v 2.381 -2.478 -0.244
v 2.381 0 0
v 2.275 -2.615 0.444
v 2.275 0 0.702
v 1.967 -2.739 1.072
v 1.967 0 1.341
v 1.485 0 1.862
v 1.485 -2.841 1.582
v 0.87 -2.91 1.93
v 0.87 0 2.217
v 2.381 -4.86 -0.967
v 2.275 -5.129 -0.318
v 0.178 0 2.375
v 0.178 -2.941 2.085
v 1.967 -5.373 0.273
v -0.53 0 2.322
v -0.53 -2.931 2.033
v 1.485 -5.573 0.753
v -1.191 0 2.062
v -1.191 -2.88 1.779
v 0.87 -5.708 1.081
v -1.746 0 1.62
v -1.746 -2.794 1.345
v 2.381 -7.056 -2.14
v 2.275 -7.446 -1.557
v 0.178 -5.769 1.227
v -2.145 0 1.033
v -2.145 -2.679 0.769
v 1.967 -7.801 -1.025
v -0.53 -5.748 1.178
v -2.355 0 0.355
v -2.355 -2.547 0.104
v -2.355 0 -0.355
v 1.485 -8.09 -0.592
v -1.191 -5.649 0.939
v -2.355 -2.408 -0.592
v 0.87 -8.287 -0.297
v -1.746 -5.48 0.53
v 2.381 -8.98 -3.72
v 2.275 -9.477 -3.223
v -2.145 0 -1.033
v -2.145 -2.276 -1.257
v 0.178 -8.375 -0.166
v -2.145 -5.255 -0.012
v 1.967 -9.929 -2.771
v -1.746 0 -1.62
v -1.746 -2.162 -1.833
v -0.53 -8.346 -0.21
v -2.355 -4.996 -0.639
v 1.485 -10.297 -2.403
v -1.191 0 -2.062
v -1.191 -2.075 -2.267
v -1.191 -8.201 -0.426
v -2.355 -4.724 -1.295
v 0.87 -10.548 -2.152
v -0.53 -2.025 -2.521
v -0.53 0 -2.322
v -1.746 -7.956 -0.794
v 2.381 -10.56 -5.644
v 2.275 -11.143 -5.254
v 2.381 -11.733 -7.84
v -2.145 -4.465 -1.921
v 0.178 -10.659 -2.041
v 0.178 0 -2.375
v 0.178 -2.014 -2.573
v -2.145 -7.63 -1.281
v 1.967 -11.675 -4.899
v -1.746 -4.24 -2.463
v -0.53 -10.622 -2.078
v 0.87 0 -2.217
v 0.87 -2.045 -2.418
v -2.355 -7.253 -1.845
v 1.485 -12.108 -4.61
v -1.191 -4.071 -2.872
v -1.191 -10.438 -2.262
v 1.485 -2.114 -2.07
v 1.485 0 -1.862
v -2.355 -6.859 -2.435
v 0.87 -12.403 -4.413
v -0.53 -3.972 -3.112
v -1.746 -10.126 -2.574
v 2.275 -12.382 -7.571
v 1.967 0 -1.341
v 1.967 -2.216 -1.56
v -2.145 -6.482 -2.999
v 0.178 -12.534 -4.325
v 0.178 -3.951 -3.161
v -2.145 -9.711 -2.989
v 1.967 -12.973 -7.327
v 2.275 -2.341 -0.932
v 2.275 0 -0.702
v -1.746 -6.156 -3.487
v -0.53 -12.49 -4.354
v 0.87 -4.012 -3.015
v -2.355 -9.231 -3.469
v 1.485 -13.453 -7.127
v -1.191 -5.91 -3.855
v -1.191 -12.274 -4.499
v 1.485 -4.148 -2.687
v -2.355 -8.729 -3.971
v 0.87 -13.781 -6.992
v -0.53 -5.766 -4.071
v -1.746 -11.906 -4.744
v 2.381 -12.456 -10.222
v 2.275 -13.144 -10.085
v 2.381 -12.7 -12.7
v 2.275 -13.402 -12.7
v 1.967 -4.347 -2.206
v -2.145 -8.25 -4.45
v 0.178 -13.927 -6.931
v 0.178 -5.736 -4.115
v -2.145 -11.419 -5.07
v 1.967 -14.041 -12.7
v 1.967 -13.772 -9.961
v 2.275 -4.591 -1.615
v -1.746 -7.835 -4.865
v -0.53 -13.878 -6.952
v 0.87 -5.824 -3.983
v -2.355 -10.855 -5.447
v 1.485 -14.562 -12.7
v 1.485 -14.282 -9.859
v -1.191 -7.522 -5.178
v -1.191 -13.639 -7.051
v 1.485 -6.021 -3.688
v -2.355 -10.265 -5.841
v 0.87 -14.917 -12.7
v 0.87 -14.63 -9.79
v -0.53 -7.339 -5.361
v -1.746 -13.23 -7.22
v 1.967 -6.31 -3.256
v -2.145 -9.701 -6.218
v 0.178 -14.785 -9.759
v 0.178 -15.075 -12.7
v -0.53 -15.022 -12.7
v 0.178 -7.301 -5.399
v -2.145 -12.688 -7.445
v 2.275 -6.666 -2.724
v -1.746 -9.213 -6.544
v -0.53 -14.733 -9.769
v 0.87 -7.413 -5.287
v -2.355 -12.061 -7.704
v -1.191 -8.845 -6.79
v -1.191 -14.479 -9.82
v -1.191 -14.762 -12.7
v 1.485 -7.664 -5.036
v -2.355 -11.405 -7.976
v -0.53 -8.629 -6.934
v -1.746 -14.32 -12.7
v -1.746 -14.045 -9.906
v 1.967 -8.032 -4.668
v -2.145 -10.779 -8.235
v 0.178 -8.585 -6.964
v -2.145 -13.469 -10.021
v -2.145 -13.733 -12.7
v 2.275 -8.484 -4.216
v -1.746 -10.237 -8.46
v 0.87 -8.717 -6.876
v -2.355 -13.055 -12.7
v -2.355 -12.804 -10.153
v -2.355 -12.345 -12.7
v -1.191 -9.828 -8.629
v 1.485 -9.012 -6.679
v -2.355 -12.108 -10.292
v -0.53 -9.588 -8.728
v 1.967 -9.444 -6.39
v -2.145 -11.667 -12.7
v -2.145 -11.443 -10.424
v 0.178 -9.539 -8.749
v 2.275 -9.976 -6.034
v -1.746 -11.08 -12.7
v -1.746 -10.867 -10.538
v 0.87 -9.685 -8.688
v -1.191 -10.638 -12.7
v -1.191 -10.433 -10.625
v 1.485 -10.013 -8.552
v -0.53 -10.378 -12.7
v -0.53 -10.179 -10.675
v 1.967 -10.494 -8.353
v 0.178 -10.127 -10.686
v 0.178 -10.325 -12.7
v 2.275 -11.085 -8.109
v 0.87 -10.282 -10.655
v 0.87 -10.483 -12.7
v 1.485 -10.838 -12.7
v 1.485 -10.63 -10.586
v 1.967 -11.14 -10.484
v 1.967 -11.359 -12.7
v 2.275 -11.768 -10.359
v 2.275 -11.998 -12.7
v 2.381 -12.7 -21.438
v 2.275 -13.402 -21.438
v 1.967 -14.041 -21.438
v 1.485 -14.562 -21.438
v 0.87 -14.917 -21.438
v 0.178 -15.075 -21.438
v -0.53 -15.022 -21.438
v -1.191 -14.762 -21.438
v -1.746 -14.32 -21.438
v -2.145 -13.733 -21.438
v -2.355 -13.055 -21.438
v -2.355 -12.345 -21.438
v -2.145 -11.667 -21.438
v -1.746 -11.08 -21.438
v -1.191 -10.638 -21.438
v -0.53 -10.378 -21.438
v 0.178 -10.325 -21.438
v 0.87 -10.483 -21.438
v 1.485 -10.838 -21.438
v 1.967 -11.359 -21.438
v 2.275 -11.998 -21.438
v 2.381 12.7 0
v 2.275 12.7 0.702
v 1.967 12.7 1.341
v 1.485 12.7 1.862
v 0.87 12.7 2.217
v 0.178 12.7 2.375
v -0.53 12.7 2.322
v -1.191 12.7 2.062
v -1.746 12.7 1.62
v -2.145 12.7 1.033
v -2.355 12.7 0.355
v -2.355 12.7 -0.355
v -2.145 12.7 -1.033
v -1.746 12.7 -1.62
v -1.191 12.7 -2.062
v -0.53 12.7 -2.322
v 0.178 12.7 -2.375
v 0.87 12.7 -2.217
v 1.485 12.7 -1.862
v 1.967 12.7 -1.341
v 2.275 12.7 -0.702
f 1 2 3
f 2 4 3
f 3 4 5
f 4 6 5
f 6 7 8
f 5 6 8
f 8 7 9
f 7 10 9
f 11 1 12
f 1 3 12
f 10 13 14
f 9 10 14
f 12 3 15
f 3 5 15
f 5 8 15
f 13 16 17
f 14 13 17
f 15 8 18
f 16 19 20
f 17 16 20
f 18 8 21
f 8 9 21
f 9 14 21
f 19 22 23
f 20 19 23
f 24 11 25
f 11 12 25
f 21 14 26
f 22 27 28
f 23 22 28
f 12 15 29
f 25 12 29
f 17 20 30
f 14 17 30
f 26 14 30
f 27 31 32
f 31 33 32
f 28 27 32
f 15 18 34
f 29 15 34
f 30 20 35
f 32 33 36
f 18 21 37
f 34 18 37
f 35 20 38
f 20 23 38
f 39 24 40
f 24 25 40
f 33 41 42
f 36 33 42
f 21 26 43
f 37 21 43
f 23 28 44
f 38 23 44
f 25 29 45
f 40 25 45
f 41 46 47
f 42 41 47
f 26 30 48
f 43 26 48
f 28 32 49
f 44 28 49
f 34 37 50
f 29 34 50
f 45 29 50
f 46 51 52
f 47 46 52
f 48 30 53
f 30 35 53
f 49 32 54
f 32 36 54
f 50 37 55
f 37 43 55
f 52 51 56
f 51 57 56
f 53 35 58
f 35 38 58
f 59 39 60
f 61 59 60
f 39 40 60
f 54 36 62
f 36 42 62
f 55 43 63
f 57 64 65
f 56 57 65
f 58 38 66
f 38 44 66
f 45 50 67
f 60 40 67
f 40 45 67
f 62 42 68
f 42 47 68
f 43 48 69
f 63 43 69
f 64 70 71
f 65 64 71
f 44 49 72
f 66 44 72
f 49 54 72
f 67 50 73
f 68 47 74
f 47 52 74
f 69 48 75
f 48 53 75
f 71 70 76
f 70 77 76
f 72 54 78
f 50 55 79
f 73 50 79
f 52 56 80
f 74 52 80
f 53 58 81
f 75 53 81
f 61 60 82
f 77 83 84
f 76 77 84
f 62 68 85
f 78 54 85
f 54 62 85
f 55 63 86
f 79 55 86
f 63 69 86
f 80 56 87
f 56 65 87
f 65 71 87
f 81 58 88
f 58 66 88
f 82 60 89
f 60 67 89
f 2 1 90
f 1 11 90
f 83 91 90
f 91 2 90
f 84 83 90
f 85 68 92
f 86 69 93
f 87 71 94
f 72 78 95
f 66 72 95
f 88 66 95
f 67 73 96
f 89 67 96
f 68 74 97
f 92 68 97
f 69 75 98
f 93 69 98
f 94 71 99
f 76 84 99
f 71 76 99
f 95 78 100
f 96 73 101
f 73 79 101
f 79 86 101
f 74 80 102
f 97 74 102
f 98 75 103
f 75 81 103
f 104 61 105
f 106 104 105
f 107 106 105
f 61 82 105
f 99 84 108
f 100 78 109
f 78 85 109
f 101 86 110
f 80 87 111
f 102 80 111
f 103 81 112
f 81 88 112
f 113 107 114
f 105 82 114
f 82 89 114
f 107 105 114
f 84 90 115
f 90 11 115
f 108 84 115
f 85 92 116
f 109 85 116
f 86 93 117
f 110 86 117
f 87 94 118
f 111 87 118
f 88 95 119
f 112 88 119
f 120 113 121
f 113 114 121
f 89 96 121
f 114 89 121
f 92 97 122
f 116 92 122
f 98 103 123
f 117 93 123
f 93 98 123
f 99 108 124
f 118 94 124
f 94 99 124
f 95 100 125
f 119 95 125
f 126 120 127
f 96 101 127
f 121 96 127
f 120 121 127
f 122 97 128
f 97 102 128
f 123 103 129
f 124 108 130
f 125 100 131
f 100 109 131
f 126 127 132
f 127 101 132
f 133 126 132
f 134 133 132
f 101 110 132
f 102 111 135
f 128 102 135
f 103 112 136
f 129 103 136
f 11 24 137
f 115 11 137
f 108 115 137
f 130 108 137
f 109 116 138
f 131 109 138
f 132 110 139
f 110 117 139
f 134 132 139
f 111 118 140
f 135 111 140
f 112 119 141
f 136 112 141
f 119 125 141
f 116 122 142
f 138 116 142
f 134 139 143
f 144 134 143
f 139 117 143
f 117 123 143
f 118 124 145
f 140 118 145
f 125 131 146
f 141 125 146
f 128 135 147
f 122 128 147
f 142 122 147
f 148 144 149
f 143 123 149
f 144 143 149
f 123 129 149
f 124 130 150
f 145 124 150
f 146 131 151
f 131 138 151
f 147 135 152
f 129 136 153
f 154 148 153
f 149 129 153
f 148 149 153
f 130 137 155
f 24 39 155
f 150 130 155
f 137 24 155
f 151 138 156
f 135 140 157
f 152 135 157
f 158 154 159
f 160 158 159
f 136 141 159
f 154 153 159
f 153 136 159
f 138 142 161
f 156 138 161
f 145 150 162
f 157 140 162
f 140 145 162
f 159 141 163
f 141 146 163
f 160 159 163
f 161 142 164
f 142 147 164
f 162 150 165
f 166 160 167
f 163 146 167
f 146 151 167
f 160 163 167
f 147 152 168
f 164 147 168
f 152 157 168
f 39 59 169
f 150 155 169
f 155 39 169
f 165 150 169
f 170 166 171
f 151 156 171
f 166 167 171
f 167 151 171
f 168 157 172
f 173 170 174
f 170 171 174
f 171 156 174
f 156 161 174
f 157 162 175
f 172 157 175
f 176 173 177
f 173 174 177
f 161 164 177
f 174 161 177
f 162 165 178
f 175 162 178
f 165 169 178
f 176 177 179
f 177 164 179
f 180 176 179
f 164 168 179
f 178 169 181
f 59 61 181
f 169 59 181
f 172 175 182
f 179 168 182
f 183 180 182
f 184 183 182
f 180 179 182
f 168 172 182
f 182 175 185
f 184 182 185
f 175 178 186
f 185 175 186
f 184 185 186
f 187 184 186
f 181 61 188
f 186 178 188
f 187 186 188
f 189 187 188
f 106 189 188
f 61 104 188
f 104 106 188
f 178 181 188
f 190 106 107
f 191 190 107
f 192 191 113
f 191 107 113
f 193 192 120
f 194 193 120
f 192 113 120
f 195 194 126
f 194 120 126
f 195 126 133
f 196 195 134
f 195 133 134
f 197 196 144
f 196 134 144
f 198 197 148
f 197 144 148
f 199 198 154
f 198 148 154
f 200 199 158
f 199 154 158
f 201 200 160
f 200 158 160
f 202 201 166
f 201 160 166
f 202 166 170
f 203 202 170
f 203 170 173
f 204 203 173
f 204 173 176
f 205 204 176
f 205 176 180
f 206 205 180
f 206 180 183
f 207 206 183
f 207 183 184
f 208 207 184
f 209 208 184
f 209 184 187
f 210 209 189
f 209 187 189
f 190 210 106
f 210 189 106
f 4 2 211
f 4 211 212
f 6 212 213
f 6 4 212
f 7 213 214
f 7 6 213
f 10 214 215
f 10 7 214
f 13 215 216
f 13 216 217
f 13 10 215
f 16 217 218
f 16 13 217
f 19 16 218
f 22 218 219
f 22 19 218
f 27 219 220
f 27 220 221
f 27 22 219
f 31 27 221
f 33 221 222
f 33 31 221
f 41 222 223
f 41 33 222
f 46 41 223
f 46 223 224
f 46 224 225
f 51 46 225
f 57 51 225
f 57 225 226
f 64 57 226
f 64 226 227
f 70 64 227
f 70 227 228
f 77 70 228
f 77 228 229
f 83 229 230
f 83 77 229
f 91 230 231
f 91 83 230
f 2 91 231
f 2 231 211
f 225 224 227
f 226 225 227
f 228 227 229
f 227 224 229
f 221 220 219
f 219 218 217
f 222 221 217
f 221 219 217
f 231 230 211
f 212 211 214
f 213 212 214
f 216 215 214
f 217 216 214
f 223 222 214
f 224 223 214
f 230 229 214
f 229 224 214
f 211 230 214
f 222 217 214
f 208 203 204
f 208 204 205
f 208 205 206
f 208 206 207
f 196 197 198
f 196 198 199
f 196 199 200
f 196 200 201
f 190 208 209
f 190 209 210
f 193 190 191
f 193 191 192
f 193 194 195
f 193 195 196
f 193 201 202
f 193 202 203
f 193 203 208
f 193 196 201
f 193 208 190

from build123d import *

# Parameters (mm, degrees)
F0_R     = 2.38125
F1_ANGLE = 90
F2_DEPTH = 8.7376
F3_DEPTH = 12.7


with BuildPart() as f1:
    # F0 (on Front) → F1 (revolve)
    with BuildSketch(Plane.XZ):
        Circle(F0_R)
    revolve(axis=Axis((1.0816315189, 0, -12.7), (1, 0, 0)), revolution_arc=F1_ANGLE)

    # F2 (add): a face of the model
    f2_faces = [f1.faces().sort_by_distance(p)[0] for p in [
        (0, -12.7, -12.7),
    ]]
    extrude(f2_faces, amount=F2_DEPTH)

    # F3 (add): a face of the model
    f3_faces = [f1.faces().sort_by_distance(p)[0] for p in [
        (0, 0, 0),
    ]]
    extrude(f3_faces, amount=F3_DEPTH)


solid = f1.part
